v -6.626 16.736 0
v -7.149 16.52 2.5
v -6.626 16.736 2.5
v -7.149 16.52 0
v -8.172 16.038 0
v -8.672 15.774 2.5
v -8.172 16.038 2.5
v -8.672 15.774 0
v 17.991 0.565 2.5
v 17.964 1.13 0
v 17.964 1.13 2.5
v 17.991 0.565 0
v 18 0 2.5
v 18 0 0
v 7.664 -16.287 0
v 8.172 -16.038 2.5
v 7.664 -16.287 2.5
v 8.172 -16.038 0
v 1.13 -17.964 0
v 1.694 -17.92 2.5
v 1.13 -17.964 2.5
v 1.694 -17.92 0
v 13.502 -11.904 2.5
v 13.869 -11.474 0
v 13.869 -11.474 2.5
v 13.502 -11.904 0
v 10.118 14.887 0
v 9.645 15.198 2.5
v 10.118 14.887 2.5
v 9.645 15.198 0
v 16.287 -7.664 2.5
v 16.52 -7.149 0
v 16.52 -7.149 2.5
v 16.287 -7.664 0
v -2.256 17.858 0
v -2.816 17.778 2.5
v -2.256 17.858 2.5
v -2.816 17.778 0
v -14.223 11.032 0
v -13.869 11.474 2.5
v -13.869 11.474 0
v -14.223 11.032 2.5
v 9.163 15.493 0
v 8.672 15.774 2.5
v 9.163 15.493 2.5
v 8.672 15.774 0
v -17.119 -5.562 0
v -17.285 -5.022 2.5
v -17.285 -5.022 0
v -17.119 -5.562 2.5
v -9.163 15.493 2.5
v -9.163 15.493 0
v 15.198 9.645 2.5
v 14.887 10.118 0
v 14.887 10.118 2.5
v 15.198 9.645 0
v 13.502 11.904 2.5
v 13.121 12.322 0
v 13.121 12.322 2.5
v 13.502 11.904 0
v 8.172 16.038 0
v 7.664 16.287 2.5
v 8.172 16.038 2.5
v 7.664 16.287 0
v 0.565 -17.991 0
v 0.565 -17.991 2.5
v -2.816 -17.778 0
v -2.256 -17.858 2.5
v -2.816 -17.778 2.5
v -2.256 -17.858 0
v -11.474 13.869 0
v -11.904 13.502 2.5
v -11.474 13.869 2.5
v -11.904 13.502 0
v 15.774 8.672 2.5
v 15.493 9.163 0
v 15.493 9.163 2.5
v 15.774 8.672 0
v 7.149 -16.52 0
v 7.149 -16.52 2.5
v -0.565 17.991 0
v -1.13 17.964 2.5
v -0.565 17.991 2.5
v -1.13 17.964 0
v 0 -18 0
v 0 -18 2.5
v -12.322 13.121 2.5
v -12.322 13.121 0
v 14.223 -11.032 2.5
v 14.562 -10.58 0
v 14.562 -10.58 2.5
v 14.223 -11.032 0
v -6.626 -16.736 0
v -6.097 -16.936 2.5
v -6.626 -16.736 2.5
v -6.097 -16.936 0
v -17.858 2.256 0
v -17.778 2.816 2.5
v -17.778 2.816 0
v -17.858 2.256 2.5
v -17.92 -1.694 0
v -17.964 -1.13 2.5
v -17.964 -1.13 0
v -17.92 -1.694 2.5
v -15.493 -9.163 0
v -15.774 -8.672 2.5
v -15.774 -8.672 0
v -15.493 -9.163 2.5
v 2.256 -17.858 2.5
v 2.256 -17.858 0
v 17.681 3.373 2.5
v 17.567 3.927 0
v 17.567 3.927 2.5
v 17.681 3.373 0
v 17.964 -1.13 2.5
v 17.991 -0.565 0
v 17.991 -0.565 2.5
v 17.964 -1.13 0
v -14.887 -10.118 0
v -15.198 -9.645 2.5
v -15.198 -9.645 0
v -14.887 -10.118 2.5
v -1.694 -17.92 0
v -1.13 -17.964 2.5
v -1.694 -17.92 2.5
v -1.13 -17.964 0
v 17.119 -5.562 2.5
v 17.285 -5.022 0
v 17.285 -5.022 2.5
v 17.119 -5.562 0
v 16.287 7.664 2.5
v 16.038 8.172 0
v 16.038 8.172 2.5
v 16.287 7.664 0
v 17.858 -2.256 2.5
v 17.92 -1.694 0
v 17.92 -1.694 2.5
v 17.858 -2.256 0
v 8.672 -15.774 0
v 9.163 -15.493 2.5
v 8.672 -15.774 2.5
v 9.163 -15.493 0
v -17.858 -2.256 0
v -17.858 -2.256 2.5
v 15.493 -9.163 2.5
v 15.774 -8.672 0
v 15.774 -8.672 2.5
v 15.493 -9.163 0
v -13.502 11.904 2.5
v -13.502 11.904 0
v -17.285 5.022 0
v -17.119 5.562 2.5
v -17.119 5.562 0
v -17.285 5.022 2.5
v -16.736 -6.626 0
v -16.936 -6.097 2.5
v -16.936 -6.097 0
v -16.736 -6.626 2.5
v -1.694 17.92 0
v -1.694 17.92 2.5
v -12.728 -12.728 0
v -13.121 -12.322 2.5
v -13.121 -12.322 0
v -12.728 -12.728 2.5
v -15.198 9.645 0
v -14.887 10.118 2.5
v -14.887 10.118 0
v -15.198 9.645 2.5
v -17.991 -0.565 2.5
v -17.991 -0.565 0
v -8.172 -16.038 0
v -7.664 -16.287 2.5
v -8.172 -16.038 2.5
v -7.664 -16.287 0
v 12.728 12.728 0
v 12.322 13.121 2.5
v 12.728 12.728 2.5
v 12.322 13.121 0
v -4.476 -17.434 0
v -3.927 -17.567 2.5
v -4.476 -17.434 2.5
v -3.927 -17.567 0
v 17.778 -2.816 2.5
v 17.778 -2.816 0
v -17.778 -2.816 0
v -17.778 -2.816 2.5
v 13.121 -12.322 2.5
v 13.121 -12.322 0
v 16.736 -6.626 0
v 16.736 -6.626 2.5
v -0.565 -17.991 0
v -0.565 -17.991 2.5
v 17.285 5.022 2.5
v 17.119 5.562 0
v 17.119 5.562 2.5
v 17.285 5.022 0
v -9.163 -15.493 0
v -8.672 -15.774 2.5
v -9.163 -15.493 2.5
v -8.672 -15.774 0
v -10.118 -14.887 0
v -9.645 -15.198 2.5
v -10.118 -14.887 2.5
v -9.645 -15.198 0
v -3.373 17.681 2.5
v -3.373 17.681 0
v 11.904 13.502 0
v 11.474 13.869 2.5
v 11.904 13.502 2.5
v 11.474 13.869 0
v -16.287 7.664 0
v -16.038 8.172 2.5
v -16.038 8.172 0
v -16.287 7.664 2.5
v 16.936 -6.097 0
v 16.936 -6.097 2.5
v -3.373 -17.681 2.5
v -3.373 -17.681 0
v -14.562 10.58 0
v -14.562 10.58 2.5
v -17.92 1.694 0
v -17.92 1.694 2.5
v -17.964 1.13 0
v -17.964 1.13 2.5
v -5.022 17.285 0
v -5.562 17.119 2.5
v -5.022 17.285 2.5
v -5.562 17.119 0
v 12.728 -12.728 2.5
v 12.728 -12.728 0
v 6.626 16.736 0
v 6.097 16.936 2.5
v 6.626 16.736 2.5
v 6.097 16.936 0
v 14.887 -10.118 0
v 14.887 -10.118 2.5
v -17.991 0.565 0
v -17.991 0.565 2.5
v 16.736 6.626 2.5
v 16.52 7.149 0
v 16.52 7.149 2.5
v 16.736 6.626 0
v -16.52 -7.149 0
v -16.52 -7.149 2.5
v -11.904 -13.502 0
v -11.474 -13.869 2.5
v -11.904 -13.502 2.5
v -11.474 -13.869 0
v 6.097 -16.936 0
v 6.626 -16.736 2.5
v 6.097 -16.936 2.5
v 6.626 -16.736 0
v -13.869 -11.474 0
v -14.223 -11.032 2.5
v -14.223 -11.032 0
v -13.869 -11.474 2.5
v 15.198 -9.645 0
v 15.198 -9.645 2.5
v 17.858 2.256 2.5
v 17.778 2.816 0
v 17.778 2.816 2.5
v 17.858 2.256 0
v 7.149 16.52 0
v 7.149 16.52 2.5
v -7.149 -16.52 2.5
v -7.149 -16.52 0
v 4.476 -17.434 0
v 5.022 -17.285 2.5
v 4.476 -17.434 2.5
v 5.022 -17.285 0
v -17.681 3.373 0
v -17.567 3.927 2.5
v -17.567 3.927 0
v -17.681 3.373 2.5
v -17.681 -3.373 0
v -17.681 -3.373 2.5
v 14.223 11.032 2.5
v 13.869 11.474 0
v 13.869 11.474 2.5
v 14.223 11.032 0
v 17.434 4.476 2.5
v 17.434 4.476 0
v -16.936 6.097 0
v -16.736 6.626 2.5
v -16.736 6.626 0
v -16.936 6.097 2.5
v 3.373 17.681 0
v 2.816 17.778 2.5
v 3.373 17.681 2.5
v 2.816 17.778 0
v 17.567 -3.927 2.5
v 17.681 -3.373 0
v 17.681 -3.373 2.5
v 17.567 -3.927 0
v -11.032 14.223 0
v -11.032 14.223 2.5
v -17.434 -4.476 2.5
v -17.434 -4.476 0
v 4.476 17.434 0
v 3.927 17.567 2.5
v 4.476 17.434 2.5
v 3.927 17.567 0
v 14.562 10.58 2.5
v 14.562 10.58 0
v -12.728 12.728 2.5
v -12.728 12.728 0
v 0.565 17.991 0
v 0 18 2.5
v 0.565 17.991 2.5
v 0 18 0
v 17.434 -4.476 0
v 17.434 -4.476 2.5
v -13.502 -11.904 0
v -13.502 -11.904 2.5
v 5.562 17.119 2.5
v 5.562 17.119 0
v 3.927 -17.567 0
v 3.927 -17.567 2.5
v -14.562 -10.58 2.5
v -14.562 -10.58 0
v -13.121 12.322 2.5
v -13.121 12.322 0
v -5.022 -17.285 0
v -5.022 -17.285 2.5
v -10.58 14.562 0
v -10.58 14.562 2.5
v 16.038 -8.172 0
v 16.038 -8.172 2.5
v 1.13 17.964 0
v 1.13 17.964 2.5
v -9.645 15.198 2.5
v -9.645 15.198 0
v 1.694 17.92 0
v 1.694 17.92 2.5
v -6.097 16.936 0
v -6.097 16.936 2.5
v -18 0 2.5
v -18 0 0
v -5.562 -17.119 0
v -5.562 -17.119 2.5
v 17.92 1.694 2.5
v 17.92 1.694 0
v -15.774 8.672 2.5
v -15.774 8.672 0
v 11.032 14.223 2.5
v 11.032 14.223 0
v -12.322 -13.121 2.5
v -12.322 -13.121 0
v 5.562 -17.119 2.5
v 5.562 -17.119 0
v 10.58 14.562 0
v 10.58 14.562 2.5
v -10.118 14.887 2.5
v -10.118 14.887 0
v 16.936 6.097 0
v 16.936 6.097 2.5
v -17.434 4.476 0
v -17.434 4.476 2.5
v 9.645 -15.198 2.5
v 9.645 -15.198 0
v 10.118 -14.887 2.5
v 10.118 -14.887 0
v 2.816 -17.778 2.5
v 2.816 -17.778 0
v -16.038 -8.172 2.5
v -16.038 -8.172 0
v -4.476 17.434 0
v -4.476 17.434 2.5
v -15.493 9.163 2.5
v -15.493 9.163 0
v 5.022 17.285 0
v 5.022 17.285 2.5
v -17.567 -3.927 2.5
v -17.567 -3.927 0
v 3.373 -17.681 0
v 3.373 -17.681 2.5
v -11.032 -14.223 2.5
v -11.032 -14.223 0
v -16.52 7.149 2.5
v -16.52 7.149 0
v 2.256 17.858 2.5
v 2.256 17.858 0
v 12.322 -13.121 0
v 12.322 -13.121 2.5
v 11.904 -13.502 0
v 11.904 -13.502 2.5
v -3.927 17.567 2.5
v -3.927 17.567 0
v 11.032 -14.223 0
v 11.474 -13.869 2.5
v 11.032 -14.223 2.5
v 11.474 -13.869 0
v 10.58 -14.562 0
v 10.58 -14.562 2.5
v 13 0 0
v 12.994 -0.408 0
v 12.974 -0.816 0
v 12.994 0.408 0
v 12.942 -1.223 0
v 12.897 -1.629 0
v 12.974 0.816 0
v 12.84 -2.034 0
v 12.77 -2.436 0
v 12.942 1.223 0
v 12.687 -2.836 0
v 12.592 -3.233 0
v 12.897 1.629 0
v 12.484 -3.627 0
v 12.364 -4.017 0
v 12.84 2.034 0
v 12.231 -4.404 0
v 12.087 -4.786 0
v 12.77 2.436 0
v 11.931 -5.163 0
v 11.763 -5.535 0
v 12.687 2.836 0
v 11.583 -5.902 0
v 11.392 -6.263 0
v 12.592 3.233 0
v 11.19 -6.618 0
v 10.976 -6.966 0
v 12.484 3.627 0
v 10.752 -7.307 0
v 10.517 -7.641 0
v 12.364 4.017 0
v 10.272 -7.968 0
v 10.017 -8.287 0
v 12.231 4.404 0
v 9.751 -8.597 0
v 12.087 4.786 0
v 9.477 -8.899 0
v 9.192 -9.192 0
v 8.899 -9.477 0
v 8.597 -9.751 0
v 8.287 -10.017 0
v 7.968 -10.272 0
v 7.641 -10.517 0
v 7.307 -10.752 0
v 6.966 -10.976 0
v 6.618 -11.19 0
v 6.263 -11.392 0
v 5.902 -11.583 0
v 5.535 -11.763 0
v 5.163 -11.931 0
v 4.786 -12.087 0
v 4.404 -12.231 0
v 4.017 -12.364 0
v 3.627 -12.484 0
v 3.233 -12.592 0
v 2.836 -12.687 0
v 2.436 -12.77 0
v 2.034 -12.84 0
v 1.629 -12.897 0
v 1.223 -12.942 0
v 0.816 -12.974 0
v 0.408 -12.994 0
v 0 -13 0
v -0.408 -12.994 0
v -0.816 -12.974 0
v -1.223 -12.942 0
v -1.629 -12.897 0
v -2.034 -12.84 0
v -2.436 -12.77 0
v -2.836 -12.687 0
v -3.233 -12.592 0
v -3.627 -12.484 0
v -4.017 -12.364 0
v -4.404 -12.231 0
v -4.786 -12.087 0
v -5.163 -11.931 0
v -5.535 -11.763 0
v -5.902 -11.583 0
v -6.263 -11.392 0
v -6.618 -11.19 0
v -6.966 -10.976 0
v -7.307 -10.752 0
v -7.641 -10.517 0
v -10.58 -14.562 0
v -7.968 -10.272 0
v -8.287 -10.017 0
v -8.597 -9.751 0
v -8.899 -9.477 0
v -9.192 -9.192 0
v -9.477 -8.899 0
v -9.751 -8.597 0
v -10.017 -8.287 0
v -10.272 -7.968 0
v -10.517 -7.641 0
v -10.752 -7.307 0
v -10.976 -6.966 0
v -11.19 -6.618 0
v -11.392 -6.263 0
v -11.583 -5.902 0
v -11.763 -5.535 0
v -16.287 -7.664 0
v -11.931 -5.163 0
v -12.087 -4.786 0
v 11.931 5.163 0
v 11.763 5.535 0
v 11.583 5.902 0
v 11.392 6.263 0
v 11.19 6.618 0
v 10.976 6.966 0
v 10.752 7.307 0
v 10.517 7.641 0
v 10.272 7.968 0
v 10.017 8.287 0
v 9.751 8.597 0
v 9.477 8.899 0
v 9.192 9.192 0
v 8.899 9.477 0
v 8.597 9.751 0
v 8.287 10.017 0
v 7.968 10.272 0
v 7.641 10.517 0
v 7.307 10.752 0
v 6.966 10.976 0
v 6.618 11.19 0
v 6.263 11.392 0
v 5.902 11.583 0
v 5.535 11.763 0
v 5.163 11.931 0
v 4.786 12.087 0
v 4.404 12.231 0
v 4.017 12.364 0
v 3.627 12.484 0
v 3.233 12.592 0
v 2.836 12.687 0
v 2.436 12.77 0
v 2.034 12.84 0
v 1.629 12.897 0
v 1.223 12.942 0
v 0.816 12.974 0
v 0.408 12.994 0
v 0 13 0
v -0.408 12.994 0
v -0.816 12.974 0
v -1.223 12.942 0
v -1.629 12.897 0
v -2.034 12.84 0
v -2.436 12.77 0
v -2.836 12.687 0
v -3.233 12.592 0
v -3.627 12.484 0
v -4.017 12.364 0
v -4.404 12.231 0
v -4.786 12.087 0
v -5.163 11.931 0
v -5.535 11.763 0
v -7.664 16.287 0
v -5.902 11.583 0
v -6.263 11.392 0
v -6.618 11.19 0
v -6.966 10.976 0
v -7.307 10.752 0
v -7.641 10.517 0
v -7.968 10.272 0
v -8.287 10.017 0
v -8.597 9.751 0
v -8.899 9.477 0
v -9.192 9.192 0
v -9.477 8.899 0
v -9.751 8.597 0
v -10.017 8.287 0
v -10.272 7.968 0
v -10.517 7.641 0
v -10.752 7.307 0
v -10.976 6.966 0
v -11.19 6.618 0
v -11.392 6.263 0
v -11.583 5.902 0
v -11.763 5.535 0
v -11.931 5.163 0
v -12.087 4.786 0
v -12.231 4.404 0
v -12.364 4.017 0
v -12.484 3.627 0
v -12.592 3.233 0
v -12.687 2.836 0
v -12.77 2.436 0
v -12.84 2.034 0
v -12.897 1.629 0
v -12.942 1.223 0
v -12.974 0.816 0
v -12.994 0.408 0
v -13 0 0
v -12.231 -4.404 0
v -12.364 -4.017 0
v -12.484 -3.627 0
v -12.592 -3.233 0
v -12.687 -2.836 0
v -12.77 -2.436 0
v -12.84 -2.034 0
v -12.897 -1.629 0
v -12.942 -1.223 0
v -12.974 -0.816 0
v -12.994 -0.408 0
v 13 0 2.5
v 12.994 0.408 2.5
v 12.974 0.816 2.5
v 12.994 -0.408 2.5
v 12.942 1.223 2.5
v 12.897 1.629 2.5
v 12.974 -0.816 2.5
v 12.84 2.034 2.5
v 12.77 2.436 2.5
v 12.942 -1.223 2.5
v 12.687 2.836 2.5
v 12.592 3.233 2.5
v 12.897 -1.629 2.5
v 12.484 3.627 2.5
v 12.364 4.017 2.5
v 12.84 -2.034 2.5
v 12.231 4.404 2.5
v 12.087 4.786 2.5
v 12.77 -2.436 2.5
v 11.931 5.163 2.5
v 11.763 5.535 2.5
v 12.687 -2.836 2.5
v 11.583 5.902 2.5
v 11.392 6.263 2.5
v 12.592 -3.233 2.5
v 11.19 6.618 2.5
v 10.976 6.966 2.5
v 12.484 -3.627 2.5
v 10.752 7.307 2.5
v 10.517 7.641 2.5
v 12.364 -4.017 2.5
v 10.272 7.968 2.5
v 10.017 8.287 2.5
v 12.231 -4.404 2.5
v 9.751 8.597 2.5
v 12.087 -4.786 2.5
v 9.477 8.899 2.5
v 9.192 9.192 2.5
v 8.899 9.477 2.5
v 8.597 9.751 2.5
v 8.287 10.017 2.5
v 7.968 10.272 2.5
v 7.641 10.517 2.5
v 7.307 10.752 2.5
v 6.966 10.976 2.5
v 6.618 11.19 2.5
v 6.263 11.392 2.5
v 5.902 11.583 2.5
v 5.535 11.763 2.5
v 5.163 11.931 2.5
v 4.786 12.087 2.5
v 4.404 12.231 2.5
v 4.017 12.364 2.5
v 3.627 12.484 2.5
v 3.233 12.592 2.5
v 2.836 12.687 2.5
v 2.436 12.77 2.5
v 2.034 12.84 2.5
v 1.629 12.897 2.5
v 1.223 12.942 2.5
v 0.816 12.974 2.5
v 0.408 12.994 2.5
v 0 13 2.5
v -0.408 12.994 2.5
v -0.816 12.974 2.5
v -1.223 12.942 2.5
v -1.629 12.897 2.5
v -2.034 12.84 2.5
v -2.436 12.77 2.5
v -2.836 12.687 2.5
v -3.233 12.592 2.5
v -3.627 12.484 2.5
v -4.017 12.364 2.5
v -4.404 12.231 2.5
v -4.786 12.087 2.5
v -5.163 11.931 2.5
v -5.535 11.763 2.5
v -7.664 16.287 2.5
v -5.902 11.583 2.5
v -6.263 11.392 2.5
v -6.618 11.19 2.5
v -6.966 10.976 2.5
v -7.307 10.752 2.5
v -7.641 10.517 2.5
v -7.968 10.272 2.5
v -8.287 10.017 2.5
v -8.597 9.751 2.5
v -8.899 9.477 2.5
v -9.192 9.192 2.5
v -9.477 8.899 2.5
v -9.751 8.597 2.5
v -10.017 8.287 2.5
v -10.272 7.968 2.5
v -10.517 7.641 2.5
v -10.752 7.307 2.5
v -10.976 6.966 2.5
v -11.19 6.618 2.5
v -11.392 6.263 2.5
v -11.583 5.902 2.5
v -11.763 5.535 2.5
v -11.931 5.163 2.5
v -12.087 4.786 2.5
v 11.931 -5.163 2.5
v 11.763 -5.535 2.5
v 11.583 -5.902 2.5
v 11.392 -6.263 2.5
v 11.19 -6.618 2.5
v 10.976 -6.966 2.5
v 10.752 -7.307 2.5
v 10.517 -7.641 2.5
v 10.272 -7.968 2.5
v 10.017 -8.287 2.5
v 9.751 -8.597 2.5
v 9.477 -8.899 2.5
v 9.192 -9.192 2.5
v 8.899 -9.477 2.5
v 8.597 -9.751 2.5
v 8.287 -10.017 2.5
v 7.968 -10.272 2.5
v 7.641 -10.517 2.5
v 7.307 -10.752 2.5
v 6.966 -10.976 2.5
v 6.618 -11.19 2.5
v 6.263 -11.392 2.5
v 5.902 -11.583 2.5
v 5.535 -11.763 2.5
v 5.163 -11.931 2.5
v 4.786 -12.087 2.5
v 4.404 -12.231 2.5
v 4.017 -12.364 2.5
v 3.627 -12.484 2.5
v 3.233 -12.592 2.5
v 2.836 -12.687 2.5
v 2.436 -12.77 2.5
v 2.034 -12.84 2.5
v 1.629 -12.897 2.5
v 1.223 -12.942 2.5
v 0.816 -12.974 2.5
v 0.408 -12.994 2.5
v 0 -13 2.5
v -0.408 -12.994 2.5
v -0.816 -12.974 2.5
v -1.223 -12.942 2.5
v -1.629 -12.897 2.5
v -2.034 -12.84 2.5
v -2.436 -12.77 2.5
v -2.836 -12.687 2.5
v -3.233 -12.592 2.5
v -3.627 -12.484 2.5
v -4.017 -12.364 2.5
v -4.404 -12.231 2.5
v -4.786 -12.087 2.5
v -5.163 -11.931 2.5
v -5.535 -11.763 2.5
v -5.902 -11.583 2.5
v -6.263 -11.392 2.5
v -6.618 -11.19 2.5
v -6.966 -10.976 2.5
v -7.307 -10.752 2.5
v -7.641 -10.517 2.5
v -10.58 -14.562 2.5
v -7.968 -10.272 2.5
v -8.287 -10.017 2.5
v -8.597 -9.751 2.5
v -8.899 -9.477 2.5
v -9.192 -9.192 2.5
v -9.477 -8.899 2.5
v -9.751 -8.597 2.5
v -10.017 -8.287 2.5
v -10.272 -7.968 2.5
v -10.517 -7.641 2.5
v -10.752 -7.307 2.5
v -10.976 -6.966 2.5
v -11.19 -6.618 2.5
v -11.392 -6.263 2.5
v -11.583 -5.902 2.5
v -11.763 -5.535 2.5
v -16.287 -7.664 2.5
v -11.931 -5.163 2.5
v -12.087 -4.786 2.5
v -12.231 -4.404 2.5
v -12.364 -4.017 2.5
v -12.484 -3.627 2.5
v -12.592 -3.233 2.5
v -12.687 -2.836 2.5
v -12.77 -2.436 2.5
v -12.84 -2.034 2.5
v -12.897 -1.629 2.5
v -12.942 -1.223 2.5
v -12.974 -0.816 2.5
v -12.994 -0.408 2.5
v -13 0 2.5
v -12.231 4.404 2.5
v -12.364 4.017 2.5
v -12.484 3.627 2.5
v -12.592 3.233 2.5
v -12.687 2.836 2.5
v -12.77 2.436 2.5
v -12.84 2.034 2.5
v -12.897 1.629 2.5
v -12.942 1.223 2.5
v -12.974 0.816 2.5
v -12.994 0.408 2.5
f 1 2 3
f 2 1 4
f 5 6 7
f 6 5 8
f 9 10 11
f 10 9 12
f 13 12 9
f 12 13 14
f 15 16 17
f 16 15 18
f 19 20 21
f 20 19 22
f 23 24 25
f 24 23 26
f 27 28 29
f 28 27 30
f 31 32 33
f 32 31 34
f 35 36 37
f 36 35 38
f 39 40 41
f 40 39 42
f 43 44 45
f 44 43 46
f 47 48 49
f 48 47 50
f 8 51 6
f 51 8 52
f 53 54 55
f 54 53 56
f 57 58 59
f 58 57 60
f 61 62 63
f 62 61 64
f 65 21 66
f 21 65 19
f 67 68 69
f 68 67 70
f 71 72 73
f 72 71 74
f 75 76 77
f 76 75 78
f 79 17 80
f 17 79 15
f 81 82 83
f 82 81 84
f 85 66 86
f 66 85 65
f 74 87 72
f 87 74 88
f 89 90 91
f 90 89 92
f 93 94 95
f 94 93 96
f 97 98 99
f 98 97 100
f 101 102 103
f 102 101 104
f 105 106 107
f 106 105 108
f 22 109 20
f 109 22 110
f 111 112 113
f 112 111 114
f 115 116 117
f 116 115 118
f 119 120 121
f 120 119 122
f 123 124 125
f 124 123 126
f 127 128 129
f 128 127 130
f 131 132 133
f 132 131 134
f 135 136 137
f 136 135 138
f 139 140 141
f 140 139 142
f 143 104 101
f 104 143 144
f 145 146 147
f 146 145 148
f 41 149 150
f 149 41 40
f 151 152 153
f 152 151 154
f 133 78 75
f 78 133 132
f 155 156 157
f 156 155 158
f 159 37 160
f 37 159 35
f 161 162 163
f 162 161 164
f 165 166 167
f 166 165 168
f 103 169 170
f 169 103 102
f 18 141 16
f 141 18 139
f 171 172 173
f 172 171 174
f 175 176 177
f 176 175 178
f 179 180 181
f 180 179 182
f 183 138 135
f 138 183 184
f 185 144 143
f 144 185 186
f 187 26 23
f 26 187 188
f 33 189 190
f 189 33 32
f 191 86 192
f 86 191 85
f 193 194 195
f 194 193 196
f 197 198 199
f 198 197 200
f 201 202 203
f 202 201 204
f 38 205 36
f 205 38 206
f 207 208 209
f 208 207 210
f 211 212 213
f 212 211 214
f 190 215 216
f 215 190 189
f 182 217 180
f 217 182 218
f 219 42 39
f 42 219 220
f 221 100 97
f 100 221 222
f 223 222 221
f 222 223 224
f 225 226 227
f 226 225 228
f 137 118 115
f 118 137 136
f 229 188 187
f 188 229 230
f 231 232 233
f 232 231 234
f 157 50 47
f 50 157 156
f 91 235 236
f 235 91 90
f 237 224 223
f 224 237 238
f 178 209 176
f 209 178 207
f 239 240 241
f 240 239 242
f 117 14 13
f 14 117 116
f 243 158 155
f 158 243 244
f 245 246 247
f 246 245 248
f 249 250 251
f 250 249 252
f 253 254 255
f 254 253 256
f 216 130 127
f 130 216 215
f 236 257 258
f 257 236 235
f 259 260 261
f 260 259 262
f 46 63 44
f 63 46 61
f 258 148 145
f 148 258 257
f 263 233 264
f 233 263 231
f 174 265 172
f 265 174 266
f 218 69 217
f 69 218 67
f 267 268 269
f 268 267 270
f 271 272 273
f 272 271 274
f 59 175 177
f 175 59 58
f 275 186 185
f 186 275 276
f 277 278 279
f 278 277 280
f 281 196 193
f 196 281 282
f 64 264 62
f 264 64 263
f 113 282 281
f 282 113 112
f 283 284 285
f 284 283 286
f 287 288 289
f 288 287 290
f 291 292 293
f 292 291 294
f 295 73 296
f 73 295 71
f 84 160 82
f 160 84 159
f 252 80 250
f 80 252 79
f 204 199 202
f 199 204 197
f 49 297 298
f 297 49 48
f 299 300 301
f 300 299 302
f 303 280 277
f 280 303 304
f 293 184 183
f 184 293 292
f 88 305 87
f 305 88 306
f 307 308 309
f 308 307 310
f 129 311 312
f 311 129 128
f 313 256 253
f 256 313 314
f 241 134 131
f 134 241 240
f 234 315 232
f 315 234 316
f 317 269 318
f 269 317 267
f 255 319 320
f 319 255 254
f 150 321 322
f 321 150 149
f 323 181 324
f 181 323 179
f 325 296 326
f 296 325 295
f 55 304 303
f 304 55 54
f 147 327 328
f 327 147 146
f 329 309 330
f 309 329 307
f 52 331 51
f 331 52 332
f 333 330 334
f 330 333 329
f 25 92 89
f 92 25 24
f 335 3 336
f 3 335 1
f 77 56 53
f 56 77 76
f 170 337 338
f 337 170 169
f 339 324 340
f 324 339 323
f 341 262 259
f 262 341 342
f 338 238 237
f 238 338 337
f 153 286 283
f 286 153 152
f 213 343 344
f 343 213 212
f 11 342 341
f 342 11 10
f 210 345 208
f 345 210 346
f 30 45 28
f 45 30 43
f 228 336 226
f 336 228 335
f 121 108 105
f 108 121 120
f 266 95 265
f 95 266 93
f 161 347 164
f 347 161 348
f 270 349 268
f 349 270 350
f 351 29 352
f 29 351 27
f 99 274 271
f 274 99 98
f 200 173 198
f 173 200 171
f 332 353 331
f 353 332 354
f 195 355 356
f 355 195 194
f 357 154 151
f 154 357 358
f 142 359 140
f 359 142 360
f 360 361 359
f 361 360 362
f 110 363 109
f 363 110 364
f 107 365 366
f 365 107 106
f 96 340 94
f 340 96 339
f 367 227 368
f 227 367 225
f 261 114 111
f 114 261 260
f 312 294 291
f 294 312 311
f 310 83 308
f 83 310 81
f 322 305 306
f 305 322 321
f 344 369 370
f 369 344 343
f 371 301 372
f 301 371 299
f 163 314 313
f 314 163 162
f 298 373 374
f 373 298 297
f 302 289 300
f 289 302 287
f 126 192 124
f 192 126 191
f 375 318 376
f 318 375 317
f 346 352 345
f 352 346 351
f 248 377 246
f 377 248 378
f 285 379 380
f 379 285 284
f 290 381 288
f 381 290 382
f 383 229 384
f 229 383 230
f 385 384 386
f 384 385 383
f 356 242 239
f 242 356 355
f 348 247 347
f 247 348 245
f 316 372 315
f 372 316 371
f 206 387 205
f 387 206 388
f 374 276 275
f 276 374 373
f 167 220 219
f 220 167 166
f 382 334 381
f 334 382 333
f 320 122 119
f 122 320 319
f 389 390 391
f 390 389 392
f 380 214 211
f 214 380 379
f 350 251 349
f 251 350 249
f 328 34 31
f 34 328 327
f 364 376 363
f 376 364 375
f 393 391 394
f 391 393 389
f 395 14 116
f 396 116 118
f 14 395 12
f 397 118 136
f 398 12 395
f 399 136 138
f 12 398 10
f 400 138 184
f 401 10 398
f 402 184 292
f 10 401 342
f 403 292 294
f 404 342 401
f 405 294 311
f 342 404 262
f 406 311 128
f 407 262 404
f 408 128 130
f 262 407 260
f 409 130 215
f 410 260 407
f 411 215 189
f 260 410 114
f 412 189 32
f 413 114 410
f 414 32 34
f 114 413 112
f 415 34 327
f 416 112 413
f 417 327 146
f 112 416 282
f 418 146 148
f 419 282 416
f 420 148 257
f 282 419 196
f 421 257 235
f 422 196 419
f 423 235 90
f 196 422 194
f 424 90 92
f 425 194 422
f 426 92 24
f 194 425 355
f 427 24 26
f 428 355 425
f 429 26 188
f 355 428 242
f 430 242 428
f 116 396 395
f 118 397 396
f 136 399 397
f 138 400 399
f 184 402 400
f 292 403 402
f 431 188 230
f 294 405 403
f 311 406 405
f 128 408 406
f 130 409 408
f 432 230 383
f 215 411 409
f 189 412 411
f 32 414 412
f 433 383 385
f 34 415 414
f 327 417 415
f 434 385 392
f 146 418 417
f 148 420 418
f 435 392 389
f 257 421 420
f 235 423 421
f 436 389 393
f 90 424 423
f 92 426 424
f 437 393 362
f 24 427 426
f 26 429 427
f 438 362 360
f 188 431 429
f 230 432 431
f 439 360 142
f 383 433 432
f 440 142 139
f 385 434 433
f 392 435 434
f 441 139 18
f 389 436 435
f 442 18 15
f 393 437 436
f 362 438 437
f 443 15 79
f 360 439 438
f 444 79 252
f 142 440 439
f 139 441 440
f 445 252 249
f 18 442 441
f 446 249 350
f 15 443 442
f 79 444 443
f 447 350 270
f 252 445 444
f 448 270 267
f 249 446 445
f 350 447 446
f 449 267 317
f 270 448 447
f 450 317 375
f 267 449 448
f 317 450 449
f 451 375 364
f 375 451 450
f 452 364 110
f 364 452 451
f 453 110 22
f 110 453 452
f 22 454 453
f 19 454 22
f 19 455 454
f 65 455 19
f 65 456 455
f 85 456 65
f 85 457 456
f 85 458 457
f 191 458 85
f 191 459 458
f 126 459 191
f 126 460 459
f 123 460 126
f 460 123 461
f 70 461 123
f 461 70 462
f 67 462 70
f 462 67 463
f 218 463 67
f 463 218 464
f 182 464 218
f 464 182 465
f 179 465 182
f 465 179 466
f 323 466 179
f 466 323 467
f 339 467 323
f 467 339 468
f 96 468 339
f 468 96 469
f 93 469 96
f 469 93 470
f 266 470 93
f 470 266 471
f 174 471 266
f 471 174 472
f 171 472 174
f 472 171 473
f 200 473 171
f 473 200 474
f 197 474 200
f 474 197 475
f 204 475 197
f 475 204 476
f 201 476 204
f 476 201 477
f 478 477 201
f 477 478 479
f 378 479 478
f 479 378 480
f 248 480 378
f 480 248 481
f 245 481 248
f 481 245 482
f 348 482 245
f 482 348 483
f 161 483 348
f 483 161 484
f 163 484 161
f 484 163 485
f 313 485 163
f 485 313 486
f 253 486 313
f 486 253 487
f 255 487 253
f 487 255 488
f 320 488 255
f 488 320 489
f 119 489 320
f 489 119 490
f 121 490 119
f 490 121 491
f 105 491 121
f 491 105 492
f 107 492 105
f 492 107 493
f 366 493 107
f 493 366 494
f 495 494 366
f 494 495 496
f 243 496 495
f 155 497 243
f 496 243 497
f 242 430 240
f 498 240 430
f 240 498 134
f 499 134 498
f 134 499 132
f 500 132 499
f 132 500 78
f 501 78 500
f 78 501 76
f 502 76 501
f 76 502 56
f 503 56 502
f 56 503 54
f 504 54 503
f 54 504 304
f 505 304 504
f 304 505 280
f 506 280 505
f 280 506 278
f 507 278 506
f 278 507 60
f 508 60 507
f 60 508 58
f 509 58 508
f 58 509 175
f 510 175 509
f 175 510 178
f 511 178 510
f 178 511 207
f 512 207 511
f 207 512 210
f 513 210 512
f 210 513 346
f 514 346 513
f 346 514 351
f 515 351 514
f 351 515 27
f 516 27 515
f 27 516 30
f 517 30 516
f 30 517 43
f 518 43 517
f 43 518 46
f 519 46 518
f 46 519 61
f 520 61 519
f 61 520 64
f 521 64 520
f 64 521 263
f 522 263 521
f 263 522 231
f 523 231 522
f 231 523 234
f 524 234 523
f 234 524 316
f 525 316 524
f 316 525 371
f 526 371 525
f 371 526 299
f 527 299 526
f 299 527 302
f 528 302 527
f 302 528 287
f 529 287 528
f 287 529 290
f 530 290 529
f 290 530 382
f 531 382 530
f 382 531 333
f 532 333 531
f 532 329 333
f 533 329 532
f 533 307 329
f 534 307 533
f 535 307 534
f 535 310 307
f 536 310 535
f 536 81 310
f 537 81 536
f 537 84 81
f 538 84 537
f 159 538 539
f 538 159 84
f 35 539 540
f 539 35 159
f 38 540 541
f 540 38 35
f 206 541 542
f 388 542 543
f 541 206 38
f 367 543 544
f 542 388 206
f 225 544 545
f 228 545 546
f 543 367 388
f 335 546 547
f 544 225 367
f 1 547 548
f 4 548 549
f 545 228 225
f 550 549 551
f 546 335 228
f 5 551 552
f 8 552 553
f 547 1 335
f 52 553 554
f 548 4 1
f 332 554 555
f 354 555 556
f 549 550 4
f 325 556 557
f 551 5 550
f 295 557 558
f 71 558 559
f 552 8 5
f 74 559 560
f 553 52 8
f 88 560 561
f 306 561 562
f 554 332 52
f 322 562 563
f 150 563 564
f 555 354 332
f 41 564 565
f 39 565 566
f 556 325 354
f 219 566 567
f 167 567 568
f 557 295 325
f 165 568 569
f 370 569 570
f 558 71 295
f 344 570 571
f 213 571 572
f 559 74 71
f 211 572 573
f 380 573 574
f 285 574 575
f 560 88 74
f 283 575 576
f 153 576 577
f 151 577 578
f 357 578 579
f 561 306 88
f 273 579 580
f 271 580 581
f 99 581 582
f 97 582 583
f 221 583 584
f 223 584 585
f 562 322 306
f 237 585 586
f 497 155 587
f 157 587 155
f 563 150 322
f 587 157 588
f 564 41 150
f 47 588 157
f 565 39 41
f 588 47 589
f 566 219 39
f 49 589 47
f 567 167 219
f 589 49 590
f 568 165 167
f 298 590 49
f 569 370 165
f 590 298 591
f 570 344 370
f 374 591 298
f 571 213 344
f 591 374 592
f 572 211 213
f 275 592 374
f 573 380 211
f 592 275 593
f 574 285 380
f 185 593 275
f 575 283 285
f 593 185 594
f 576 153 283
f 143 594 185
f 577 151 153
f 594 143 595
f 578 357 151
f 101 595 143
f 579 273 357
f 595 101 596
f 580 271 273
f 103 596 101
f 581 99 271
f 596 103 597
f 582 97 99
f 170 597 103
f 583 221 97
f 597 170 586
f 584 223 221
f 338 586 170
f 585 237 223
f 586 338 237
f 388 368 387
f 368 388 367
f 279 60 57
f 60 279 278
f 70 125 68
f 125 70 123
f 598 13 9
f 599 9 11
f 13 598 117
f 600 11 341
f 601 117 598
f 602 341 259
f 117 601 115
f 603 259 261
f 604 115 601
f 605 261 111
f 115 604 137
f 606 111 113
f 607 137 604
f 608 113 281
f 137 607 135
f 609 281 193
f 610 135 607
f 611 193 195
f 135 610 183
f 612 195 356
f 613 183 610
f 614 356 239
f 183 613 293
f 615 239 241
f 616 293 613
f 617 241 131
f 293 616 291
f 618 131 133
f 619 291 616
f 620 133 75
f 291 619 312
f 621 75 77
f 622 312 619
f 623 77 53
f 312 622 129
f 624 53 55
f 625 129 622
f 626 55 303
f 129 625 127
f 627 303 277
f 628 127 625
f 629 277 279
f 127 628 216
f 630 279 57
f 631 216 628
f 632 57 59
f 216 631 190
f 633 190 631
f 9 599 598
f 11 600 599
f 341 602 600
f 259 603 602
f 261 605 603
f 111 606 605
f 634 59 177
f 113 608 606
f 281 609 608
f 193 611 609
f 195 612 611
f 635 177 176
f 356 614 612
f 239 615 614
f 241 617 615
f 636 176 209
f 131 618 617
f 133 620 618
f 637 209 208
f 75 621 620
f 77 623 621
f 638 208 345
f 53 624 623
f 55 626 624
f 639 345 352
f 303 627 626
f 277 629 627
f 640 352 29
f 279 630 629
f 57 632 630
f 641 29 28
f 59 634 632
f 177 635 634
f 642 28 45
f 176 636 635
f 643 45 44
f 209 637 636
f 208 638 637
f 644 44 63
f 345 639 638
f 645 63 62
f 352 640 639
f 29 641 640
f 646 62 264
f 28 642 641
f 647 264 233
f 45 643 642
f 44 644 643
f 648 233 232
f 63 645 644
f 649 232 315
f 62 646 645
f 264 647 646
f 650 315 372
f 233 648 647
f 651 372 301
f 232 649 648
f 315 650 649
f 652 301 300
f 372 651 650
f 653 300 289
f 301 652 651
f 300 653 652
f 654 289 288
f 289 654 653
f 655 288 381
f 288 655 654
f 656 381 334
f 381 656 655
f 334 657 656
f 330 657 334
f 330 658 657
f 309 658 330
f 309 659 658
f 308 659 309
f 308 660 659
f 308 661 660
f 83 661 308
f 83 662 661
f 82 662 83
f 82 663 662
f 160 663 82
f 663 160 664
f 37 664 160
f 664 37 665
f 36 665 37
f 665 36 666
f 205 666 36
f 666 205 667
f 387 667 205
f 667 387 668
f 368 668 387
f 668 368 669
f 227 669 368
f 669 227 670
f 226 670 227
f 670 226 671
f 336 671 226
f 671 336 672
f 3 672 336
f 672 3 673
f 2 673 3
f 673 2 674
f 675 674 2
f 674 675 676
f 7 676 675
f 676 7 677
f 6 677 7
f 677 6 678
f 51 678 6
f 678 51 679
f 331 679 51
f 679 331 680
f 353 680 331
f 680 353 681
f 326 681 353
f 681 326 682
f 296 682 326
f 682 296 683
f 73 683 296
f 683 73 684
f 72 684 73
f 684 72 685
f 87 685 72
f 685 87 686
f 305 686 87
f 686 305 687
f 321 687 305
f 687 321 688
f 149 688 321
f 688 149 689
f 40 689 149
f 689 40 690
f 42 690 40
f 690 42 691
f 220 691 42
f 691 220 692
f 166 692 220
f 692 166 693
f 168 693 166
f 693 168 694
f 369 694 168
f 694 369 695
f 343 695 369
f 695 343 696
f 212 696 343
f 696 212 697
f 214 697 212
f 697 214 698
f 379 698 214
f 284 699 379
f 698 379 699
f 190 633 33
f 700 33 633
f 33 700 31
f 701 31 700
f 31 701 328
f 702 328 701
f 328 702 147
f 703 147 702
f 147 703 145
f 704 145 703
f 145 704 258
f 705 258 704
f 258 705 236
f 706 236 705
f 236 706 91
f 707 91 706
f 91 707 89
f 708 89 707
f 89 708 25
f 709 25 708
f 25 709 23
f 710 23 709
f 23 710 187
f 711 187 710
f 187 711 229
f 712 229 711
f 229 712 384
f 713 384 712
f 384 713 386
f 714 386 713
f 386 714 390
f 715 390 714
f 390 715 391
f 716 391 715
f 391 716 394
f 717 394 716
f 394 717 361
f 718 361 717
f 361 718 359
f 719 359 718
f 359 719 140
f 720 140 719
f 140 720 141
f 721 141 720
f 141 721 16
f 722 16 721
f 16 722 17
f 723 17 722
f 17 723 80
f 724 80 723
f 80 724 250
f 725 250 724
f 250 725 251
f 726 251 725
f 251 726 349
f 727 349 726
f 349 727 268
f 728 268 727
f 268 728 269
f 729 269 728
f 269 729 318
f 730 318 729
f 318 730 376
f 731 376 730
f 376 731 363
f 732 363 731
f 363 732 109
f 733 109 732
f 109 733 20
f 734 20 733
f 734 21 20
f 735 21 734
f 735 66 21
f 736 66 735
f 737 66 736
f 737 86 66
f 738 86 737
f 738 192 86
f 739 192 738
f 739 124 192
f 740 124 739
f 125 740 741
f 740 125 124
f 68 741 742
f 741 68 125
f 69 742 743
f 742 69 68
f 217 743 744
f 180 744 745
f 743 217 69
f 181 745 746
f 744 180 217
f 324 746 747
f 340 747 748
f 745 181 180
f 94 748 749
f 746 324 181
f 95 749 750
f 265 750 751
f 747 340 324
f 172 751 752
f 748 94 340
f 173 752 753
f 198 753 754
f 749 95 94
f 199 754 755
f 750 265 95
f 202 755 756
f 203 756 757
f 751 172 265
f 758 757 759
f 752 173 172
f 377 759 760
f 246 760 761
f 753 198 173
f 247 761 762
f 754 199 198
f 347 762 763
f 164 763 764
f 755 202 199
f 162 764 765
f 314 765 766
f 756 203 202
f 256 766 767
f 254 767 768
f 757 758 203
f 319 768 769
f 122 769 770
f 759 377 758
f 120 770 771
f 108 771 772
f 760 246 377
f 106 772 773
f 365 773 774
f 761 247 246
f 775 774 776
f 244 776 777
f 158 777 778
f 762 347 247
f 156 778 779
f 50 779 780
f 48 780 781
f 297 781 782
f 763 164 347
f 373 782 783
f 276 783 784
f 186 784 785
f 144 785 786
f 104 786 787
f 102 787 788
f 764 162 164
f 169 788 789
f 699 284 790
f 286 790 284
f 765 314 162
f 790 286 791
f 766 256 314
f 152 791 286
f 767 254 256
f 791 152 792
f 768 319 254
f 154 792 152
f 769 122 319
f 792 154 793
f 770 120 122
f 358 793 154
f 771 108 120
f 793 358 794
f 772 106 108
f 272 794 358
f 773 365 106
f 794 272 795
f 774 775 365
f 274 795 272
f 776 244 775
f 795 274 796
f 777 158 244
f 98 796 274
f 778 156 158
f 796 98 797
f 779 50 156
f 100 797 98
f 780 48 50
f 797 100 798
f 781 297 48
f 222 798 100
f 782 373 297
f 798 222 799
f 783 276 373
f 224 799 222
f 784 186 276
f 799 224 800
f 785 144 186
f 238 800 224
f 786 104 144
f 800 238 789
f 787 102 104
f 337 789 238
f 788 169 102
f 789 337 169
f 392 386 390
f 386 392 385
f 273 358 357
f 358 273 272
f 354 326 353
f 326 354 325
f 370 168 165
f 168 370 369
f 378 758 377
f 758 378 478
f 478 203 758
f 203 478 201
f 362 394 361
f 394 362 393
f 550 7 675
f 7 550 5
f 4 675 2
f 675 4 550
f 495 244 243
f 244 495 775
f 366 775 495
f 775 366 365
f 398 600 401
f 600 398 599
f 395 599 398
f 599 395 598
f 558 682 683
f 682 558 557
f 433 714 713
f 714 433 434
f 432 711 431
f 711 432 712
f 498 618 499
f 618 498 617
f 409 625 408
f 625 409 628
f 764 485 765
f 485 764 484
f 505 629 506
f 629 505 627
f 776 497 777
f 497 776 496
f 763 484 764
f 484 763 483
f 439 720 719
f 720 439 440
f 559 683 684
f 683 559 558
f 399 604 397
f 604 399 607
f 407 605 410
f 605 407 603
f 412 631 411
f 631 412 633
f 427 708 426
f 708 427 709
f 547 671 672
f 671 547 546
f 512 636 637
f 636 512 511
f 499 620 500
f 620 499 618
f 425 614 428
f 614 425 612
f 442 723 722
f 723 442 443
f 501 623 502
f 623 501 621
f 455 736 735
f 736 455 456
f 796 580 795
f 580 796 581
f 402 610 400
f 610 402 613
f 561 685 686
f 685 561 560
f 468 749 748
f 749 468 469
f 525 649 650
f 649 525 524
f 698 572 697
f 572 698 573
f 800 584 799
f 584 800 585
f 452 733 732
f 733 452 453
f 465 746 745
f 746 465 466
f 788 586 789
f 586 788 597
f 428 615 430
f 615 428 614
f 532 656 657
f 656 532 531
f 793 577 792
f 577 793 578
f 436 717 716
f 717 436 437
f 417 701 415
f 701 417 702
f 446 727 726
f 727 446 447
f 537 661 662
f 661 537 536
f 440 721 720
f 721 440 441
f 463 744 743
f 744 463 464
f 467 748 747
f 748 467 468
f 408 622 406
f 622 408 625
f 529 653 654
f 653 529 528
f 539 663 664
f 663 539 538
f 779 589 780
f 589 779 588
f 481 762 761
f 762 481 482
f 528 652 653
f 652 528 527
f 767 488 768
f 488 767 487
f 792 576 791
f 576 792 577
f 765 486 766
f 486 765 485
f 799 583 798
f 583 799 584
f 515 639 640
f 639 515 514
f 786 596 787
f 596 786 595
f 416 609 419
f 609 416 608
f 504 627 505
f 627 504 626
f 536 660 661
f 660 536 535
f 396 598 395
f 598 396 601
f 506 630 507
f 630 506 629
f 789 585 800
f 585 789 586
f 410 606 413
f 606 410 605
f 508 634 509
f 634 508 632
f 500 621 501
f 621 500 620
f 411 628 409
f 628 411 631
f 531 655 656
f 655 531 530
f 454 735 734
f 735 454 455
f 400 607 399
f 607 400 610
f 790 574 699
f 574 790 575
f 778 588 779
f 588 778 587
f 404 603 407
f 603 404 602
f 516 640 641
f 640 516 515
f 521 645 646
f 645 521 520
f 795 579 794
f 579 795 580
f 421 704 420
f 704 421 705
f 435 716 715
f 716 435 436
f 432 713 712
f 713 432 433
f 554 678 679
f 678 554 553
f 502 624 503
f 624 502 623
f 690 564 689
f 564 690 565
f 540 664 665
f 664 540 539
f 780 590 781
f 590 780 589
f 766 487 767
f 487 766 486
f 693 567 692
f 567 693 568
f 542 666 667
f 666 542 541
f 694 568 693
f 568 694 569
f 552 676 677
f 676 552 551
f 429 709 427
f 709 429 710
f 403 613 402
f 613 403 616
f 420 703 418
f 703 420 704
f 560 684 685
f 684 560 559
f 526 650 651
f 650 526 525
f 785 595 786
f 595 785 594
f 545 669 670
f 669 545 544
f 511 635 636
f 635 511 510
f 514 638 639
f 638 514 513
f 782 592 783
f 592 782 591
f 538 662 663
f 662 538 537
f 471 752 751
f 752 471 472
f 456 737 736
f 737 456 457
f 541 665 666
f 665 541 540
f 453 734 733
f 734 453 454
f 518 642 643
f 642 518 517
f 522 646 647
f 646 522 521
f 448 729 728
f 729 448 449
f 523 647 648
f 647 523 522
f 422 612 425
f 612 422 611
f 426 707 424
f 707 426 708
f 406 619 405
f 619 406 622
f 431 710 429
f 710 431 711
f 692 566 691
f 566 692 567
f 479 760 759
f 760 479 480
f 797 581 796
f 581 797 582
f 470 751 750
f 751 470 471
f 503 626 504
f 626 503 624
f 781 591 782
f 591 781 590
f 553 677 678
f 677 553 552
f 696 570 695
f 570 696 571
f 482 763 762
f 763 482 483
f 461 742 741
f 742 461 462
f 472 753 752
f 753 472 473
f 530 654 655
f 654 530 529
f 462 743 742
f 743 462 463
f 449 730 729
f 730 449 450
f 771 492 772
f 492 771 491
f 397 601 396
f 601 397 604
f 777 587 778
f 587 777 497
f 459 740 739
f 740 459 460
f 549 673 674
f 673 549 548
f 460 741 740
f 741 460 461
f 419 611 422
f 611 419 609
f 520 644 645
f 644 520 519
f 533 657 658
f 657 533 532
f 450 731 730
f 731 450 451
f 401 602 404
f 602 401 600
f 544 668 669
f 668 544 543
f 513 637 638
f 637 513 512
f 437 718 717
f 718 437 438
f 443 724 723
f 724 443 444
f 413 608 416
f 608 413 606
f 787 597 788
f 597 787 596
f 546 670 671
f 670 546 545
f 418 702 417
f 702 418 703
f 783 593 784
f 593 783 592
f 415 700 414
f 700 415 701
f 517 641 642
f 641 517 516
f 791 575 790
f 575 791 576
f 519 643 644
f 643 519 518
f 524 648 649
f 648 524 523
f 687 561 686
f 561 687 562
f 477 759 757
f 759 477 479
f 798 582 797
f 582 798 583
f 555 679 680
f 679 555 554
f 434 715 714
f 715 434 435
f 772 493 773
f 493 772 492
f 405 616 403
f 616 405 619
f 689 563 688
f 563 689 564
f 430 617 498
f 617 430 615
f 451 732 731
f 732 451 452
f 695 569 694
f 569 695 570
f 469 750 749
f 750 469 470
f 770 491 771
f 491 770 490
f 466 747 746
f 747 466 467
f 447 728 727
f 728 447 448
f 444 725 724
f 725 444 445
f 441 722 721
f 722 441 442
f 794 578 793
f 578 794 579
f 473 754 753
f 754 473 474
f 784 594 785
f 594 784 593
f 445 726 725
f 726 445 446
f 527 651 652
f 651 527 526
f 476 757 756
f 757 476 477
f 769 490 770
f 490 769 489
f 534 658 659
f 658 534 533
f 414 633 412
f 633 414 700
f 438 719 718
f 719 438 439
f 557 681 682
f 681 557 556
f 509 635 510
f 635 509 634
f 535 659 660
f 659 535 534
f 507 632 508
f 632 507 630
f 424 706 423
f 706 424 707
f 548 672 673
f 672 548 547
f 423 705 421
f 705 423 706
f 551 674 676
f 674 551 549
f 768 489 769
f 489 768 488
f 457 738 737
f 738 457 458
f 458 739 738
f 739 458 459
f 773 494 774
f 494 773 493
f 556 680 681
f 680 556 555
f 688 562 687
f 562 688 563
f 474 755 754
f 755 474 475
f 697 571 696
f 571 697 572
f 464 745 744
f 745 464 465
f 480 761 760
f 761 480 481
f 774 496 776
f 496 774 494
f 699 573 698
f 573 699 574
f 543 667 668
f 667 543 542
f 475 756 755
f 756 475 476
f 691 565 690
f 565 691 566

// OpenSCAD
use <Write.scad>

// condition text
txt="Disadvantage";

// number of times to print the text
num=2; // [0, 1, 2, 3, 4]

// circle accuracy
fn=200; // [100:255]

// ring height
ring_h=2.5;

// ring inner radius
ring_inner_radius=13;

// ring outter radius
ring_outter_radius=18;

// letter size
text_h=5;

// text height
text_t=2;

// text spacing
text_space=1.0;

/*
Notes:
Setting text_h<5 makes the next not being sliced correctly in simplify3d it seems
*/

module cr(conditiontext,num=3, ring_h = 2.5,ring_inner_radius=13, ring_outter_radius=18,text_h=5 , text_t=2, text_space=1){
    text_z_offset=text_t/2-0.1;
    text_z_position=ring_h+text_z_offset;
    text_radius=ring_inner_radius+((ring_outter_radius-ring_inner_radius)/2);
    difference(){
        cylinder(r=ring_outter_radius,h=ring_h,$fn=fn);
        translate([0,0,-1])cylinder(r=ring_inner_radius,h=ring_h+2,$fn=fn);
    }
    writecircle(text=conditiontext, t=text_t, where=[0,0,text_z_position], h=text_h,radius=text_radius,space=text_space);
    if(num>1){
        for(i=[1:num]){
            rotate([0,0,(360/num)*i])writecircle(text=conditiontext,t=text_t, where=[0,0,text_z_position], h=text_h,radius=text_radius,space=text_space);        
        }
    }
}



cr(txt,num,ring_h,ring_inner_radius,ring_outter_radius,text_h,text_t,text_space);
echo("Built ", txt, " with num=", num);


//cr("Hunter's Mark",2);
//cr("Poisoned",3);
//cr("Advantage",3);
//cr("Disadvantage",2);
//cr("Grappled");
//cr("Stunned");
//cr("Charmed");
//cr("Invisible",2);
//cr("Restrained",2);
